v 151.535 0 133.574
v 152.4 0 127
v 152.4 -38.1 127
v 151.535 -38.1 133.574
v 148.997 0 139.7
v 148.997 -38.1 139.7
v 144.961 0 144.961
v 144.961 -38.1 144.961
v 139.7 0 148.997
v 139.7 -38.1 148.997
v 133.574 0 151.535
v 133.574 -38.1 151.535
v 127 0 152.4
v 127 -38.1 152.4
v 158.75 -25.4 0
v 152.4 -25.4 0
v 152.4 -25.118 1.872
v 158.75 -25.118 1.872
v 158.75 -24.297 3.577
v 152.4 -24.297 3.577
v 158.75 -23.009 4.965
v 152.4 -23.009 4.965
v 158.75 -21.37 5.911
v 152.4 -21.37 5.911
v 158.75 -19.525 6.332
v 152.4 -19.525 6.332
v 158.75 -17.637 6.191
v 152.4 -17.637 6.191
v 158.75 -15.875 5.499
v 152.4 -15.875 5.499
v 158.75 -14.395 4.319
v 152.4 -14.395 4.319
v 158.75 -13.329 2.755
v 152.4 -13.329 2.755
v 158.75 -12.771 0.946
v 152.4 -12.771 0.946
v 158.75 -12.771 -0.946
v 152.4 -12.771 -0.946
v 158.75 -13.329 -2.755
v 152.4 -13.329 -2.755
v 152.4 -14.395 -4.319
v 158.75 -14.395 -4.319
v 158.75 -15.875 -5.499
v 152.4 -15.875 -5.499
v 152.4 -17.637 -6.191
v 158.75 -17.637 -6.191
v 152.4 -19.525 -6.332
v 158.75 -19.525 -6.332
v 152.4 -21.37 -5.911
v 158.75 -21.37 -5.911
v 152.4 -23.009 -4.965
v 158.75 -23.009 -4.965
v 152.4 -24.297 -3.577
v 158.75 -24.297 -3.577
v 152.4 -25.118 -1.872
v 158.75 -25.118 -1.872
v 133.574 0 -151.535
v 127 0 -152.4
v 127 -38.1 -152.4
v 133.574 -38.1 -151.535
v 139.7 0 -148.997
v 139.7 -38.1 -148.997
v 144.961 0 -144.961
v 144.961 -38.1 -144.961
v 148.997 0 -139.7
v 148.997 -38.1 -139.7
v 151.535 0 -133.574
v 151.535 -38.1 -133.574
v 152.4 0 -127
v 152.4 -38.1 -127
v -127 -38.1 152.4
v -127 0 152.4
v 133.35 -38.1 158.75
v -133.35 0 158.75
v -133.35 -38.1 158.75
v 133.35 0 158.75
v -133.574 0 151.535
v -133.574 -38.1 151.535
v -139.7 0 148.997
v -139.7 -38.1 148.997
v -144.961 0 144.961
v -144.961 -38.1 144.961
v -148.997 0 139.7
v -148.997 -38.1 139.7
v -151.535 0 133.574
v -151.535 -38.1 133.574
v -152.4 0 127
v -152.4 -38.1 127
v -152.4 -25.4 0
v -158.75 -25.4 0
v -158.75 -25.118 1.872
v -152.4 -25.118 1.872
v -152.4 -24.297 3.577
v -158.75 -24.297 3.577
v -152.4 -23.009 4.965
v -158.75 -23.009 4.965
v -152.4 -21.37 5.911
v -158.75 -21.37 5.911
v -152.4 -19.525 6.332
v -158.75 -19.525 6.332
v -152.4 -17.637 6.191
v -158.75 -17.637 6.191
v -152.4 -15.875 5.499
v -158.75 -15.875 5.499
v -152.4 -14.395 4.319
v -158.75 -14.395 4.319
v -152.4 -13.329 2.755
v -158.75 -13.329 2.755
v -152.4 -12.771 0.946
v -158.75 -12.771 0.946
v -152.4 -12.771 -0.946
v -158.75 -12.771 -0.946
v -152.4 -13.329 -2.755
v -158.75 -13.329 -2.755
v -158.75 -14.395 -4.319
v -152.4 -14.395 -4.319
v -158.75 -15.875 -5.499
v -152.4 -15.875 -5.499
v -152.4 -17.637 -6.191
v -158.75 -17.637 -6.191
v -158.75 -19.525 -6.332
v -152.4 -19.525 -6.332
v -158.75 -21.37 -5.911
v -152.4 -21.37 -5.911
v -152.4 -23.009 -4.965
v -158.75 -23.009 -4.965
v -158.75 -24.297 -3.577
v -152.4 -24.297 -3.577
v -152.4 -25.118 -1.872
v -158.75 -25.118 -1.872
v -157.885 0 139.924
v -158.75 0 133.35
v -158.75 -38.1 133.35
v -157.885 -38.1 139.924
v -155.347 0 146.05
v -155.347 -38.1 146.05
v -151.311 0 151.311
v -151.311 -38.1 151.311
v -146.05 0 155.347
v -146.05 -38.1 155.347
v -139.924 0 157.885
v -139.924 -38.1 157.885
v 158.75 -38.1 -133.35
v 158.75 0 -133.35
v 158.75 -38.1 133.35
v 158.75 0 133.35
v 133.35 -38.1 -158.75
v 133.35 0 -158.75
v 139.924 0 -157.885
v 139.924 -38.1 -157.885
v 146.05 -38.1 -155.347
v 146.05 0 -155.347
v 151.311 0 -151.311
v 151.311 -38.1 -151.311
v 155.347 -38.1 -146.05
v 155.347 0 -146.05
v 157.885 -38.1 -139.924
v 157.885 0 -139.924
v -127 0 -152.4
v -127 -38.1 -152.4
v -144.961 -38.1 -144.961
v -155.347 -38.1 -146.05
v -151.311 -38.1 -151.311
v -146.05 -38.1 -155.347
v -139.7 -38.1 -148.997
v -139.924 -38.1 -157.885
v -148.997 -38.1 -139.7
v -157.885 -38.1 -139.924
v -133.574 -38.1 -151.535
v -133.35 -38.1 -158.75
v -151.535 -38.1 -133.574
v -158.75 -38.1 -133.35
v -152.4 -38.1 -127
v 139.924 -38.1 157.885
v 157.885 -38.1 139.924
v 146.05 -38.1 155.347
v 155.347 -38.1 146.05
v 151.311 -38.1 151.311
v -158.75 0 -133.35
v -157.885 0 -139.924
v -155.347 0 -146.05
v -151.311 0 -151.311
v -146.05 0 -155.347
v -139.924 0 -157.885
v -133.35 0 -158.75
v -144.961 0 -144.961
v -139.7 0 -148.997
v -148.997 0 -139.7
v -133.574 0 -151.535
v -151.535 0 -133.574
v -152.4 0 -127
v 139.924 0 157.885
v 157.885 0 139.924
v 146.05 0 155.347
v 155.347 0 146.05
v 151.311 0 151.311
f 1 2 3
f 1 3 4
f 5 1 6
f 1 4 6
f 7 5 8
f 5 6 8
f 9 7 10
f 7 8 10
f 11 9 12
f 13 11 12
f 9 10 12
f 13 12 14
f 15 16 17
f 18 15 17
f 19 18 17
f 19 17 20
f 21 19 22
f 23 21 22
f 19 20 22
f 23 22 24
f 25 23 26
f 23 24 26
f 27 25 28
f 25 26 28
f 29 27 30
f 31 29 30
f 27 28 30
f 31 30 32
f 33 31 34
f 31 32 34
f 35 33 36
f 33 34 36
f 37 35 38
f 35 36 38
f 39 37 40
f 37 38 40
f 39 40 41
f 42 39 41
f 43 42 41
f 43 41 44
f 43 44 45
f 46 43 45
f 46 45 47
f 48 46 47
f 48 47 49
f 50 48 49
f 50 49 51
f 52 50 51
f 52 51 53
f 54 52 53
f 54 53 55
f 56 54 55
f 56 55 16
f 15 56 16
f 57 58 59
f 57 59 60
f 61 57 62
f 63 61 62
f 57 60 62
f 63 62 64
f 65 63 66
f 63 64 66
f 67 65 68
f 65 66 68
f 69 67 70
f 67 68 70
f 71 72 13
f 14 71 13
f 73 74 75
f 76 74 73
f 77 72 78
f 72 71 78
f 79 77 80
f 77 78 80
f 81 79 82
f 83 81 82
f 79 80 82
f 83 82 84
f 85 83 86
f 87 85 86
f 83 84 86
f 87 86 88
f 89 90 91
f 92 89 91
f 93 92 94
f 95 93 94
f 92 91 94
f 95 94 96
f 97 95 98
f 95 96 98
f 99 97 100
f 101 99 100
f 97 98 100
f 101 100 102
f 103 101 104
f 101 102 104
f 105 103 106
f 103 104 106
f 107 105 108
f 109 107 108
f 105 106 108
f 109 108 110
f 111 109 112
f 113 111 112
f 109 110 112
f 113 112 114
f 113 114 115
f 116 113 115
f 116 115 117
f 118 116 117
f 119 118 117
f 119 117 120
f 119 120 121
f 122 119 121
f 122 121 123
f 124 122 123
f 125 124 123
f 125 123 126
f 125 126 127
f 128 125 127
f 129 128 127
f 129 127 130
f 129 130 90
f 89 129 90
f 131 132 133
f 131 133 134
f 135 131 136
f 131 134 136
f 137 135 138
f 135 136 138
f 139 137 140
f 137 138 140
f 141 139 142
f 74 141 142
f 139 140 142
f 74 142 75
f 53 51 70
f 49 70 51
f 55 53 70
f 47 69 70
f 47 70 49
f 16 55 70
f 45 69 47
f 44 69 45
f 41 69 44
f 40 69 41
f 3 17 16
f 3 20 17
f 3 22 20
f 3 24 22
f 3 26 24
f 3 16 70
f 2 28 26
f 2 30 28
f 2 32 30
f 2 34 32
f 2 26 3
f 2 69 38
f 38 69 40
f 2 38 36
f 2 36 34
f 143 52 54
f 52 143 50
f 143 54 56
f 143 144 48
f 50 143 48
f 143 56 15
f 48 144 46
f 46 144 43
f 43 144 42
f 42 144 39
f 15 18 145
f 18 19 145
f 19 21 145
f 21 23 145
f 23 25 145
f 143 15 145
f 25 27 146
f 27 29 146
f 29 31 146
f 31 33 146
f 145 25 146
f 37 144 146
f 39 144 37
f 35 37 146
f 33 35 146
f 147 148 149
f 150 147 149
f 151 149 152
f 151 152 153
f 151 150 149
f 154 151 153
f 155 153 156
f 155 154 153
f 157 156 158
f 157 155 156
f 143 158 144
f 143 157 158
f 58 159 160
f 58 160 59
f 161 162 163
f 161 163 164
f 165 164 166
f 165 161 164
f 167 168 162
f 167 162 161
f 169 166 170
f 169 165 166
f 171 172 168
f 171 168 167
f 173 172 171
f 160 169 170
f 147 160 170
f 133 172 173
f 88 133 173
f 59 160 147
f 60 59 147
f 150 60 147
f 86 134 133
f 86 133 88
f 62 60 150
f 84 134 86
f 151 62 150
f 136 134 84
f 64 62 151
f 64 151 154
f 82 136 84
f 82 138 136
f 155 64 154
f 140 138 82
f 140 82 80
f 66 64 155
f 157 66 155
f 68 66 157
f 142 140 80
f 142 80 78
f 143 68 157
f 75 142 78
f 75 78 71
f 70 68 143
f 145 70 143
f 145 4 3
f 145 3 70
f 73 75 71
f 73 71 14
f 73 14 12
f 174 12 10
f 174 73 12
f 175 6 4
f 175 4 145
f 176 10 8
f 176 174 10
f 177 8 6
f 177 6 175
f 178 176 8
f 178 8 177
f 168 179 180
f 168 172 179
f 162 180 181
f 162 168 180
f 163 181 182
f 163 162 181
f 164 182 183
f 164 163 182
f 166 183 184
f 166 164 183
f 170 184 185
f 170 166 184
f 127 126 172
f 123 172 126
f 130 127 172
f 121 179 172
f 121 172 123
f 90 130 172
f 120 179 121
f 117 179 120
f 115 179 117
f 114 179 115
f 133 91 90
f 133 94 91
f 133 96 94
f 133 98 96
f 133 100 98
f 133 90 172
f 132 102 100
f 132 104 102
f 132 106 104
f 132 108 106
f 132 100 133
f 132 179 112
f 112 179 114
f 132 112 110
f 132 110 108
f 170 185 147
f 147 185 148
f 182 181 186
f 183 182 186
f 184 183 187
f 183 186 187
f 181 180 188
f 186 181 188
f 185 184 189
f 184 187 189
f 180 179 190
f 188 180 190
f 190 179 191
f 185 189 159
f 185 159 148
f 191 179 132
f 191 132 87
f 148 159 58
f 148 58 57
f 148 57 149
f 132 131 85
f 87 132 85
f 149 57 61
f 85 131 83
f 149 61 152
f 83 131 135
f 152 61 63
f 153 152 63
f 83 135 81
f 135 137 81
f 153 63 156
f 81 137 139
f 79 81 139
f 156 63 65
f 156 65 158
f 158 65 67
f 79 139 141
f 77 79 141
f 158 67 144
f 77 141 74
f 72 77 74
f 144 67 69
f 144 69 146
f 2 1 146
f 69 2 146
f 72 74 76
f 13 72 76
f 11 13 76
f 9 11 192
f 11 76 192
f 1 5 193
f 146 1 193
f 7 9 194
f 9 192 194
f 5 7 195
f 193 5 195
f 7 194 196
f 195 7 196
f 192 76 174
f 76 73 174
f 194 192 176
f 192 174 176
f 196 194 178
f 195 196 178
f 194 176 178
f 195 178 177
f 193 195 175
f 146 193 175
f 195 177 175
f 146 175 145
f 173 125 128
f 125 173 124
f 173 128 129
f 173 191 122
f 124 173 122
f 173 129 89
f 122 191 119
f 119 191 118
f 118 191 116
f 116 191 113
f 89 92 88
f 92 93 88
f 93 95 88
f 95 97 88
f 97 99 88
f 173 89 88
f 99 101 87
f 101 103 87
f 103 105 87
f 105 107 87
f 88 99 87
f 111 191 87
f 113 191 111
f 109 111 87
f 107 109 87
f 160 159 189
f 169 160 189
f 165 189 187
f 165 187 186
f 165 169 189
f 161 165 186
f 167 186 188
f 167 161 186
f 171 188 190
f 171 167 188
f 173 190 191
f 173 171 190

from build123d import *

# Parameters (mm, degrees)
F0_W     = 317.5
F0_H     = 317.5
F0_W_2   = 304.8
F0_H_2   = 304.8
F1_DEPTH = 38.1
F2_R     = 25.4
F3_D     = 12.7
F4_D     = 12.7


with BuildPart() as f1:
    # F0 (on Front) → F1 (new body)
    with BuildSketch(Plane.XZ):
        Rectangle(F0_W, F0_H)
        Rectangle(F0_W_2, F0_H_2, mode=Mode.SUBTRACT)
    extrude(amount=F1_DEPTH)

    # F2
    f2_edges = [f1.edges().sort_by_distance(p)[0] for p in [
        (152.4, -19.05, -152.4),
        (-152.4, -19.05, -152.4),
        (-152.4, -19.05, 152.4),
        (152.4, -19.05, 152.4),
        (158.75, -19.05, -158.75),
        (158.75, -19.05, 158.75),
        (-158.75, -19.05, 158.75),
        (-158.75, -19.05, -158.75),
    ]]
    fillet(f2_edges, radius=F2_R)

    # F3 (through all)
    with Locations(Plane.YZ):
        with Locations((-19.05, 0)):
            Hole(F3_D / 2)

    # F4 (through all)
    with Locations(Plane(origin=(0, 0, 0), x_dir=(0, 1, 0), z_dir=(-1, 0, 0))):
        with Locations((-19.05, 0)):
            Hole(F4_D / 2)


solid = f1.part
